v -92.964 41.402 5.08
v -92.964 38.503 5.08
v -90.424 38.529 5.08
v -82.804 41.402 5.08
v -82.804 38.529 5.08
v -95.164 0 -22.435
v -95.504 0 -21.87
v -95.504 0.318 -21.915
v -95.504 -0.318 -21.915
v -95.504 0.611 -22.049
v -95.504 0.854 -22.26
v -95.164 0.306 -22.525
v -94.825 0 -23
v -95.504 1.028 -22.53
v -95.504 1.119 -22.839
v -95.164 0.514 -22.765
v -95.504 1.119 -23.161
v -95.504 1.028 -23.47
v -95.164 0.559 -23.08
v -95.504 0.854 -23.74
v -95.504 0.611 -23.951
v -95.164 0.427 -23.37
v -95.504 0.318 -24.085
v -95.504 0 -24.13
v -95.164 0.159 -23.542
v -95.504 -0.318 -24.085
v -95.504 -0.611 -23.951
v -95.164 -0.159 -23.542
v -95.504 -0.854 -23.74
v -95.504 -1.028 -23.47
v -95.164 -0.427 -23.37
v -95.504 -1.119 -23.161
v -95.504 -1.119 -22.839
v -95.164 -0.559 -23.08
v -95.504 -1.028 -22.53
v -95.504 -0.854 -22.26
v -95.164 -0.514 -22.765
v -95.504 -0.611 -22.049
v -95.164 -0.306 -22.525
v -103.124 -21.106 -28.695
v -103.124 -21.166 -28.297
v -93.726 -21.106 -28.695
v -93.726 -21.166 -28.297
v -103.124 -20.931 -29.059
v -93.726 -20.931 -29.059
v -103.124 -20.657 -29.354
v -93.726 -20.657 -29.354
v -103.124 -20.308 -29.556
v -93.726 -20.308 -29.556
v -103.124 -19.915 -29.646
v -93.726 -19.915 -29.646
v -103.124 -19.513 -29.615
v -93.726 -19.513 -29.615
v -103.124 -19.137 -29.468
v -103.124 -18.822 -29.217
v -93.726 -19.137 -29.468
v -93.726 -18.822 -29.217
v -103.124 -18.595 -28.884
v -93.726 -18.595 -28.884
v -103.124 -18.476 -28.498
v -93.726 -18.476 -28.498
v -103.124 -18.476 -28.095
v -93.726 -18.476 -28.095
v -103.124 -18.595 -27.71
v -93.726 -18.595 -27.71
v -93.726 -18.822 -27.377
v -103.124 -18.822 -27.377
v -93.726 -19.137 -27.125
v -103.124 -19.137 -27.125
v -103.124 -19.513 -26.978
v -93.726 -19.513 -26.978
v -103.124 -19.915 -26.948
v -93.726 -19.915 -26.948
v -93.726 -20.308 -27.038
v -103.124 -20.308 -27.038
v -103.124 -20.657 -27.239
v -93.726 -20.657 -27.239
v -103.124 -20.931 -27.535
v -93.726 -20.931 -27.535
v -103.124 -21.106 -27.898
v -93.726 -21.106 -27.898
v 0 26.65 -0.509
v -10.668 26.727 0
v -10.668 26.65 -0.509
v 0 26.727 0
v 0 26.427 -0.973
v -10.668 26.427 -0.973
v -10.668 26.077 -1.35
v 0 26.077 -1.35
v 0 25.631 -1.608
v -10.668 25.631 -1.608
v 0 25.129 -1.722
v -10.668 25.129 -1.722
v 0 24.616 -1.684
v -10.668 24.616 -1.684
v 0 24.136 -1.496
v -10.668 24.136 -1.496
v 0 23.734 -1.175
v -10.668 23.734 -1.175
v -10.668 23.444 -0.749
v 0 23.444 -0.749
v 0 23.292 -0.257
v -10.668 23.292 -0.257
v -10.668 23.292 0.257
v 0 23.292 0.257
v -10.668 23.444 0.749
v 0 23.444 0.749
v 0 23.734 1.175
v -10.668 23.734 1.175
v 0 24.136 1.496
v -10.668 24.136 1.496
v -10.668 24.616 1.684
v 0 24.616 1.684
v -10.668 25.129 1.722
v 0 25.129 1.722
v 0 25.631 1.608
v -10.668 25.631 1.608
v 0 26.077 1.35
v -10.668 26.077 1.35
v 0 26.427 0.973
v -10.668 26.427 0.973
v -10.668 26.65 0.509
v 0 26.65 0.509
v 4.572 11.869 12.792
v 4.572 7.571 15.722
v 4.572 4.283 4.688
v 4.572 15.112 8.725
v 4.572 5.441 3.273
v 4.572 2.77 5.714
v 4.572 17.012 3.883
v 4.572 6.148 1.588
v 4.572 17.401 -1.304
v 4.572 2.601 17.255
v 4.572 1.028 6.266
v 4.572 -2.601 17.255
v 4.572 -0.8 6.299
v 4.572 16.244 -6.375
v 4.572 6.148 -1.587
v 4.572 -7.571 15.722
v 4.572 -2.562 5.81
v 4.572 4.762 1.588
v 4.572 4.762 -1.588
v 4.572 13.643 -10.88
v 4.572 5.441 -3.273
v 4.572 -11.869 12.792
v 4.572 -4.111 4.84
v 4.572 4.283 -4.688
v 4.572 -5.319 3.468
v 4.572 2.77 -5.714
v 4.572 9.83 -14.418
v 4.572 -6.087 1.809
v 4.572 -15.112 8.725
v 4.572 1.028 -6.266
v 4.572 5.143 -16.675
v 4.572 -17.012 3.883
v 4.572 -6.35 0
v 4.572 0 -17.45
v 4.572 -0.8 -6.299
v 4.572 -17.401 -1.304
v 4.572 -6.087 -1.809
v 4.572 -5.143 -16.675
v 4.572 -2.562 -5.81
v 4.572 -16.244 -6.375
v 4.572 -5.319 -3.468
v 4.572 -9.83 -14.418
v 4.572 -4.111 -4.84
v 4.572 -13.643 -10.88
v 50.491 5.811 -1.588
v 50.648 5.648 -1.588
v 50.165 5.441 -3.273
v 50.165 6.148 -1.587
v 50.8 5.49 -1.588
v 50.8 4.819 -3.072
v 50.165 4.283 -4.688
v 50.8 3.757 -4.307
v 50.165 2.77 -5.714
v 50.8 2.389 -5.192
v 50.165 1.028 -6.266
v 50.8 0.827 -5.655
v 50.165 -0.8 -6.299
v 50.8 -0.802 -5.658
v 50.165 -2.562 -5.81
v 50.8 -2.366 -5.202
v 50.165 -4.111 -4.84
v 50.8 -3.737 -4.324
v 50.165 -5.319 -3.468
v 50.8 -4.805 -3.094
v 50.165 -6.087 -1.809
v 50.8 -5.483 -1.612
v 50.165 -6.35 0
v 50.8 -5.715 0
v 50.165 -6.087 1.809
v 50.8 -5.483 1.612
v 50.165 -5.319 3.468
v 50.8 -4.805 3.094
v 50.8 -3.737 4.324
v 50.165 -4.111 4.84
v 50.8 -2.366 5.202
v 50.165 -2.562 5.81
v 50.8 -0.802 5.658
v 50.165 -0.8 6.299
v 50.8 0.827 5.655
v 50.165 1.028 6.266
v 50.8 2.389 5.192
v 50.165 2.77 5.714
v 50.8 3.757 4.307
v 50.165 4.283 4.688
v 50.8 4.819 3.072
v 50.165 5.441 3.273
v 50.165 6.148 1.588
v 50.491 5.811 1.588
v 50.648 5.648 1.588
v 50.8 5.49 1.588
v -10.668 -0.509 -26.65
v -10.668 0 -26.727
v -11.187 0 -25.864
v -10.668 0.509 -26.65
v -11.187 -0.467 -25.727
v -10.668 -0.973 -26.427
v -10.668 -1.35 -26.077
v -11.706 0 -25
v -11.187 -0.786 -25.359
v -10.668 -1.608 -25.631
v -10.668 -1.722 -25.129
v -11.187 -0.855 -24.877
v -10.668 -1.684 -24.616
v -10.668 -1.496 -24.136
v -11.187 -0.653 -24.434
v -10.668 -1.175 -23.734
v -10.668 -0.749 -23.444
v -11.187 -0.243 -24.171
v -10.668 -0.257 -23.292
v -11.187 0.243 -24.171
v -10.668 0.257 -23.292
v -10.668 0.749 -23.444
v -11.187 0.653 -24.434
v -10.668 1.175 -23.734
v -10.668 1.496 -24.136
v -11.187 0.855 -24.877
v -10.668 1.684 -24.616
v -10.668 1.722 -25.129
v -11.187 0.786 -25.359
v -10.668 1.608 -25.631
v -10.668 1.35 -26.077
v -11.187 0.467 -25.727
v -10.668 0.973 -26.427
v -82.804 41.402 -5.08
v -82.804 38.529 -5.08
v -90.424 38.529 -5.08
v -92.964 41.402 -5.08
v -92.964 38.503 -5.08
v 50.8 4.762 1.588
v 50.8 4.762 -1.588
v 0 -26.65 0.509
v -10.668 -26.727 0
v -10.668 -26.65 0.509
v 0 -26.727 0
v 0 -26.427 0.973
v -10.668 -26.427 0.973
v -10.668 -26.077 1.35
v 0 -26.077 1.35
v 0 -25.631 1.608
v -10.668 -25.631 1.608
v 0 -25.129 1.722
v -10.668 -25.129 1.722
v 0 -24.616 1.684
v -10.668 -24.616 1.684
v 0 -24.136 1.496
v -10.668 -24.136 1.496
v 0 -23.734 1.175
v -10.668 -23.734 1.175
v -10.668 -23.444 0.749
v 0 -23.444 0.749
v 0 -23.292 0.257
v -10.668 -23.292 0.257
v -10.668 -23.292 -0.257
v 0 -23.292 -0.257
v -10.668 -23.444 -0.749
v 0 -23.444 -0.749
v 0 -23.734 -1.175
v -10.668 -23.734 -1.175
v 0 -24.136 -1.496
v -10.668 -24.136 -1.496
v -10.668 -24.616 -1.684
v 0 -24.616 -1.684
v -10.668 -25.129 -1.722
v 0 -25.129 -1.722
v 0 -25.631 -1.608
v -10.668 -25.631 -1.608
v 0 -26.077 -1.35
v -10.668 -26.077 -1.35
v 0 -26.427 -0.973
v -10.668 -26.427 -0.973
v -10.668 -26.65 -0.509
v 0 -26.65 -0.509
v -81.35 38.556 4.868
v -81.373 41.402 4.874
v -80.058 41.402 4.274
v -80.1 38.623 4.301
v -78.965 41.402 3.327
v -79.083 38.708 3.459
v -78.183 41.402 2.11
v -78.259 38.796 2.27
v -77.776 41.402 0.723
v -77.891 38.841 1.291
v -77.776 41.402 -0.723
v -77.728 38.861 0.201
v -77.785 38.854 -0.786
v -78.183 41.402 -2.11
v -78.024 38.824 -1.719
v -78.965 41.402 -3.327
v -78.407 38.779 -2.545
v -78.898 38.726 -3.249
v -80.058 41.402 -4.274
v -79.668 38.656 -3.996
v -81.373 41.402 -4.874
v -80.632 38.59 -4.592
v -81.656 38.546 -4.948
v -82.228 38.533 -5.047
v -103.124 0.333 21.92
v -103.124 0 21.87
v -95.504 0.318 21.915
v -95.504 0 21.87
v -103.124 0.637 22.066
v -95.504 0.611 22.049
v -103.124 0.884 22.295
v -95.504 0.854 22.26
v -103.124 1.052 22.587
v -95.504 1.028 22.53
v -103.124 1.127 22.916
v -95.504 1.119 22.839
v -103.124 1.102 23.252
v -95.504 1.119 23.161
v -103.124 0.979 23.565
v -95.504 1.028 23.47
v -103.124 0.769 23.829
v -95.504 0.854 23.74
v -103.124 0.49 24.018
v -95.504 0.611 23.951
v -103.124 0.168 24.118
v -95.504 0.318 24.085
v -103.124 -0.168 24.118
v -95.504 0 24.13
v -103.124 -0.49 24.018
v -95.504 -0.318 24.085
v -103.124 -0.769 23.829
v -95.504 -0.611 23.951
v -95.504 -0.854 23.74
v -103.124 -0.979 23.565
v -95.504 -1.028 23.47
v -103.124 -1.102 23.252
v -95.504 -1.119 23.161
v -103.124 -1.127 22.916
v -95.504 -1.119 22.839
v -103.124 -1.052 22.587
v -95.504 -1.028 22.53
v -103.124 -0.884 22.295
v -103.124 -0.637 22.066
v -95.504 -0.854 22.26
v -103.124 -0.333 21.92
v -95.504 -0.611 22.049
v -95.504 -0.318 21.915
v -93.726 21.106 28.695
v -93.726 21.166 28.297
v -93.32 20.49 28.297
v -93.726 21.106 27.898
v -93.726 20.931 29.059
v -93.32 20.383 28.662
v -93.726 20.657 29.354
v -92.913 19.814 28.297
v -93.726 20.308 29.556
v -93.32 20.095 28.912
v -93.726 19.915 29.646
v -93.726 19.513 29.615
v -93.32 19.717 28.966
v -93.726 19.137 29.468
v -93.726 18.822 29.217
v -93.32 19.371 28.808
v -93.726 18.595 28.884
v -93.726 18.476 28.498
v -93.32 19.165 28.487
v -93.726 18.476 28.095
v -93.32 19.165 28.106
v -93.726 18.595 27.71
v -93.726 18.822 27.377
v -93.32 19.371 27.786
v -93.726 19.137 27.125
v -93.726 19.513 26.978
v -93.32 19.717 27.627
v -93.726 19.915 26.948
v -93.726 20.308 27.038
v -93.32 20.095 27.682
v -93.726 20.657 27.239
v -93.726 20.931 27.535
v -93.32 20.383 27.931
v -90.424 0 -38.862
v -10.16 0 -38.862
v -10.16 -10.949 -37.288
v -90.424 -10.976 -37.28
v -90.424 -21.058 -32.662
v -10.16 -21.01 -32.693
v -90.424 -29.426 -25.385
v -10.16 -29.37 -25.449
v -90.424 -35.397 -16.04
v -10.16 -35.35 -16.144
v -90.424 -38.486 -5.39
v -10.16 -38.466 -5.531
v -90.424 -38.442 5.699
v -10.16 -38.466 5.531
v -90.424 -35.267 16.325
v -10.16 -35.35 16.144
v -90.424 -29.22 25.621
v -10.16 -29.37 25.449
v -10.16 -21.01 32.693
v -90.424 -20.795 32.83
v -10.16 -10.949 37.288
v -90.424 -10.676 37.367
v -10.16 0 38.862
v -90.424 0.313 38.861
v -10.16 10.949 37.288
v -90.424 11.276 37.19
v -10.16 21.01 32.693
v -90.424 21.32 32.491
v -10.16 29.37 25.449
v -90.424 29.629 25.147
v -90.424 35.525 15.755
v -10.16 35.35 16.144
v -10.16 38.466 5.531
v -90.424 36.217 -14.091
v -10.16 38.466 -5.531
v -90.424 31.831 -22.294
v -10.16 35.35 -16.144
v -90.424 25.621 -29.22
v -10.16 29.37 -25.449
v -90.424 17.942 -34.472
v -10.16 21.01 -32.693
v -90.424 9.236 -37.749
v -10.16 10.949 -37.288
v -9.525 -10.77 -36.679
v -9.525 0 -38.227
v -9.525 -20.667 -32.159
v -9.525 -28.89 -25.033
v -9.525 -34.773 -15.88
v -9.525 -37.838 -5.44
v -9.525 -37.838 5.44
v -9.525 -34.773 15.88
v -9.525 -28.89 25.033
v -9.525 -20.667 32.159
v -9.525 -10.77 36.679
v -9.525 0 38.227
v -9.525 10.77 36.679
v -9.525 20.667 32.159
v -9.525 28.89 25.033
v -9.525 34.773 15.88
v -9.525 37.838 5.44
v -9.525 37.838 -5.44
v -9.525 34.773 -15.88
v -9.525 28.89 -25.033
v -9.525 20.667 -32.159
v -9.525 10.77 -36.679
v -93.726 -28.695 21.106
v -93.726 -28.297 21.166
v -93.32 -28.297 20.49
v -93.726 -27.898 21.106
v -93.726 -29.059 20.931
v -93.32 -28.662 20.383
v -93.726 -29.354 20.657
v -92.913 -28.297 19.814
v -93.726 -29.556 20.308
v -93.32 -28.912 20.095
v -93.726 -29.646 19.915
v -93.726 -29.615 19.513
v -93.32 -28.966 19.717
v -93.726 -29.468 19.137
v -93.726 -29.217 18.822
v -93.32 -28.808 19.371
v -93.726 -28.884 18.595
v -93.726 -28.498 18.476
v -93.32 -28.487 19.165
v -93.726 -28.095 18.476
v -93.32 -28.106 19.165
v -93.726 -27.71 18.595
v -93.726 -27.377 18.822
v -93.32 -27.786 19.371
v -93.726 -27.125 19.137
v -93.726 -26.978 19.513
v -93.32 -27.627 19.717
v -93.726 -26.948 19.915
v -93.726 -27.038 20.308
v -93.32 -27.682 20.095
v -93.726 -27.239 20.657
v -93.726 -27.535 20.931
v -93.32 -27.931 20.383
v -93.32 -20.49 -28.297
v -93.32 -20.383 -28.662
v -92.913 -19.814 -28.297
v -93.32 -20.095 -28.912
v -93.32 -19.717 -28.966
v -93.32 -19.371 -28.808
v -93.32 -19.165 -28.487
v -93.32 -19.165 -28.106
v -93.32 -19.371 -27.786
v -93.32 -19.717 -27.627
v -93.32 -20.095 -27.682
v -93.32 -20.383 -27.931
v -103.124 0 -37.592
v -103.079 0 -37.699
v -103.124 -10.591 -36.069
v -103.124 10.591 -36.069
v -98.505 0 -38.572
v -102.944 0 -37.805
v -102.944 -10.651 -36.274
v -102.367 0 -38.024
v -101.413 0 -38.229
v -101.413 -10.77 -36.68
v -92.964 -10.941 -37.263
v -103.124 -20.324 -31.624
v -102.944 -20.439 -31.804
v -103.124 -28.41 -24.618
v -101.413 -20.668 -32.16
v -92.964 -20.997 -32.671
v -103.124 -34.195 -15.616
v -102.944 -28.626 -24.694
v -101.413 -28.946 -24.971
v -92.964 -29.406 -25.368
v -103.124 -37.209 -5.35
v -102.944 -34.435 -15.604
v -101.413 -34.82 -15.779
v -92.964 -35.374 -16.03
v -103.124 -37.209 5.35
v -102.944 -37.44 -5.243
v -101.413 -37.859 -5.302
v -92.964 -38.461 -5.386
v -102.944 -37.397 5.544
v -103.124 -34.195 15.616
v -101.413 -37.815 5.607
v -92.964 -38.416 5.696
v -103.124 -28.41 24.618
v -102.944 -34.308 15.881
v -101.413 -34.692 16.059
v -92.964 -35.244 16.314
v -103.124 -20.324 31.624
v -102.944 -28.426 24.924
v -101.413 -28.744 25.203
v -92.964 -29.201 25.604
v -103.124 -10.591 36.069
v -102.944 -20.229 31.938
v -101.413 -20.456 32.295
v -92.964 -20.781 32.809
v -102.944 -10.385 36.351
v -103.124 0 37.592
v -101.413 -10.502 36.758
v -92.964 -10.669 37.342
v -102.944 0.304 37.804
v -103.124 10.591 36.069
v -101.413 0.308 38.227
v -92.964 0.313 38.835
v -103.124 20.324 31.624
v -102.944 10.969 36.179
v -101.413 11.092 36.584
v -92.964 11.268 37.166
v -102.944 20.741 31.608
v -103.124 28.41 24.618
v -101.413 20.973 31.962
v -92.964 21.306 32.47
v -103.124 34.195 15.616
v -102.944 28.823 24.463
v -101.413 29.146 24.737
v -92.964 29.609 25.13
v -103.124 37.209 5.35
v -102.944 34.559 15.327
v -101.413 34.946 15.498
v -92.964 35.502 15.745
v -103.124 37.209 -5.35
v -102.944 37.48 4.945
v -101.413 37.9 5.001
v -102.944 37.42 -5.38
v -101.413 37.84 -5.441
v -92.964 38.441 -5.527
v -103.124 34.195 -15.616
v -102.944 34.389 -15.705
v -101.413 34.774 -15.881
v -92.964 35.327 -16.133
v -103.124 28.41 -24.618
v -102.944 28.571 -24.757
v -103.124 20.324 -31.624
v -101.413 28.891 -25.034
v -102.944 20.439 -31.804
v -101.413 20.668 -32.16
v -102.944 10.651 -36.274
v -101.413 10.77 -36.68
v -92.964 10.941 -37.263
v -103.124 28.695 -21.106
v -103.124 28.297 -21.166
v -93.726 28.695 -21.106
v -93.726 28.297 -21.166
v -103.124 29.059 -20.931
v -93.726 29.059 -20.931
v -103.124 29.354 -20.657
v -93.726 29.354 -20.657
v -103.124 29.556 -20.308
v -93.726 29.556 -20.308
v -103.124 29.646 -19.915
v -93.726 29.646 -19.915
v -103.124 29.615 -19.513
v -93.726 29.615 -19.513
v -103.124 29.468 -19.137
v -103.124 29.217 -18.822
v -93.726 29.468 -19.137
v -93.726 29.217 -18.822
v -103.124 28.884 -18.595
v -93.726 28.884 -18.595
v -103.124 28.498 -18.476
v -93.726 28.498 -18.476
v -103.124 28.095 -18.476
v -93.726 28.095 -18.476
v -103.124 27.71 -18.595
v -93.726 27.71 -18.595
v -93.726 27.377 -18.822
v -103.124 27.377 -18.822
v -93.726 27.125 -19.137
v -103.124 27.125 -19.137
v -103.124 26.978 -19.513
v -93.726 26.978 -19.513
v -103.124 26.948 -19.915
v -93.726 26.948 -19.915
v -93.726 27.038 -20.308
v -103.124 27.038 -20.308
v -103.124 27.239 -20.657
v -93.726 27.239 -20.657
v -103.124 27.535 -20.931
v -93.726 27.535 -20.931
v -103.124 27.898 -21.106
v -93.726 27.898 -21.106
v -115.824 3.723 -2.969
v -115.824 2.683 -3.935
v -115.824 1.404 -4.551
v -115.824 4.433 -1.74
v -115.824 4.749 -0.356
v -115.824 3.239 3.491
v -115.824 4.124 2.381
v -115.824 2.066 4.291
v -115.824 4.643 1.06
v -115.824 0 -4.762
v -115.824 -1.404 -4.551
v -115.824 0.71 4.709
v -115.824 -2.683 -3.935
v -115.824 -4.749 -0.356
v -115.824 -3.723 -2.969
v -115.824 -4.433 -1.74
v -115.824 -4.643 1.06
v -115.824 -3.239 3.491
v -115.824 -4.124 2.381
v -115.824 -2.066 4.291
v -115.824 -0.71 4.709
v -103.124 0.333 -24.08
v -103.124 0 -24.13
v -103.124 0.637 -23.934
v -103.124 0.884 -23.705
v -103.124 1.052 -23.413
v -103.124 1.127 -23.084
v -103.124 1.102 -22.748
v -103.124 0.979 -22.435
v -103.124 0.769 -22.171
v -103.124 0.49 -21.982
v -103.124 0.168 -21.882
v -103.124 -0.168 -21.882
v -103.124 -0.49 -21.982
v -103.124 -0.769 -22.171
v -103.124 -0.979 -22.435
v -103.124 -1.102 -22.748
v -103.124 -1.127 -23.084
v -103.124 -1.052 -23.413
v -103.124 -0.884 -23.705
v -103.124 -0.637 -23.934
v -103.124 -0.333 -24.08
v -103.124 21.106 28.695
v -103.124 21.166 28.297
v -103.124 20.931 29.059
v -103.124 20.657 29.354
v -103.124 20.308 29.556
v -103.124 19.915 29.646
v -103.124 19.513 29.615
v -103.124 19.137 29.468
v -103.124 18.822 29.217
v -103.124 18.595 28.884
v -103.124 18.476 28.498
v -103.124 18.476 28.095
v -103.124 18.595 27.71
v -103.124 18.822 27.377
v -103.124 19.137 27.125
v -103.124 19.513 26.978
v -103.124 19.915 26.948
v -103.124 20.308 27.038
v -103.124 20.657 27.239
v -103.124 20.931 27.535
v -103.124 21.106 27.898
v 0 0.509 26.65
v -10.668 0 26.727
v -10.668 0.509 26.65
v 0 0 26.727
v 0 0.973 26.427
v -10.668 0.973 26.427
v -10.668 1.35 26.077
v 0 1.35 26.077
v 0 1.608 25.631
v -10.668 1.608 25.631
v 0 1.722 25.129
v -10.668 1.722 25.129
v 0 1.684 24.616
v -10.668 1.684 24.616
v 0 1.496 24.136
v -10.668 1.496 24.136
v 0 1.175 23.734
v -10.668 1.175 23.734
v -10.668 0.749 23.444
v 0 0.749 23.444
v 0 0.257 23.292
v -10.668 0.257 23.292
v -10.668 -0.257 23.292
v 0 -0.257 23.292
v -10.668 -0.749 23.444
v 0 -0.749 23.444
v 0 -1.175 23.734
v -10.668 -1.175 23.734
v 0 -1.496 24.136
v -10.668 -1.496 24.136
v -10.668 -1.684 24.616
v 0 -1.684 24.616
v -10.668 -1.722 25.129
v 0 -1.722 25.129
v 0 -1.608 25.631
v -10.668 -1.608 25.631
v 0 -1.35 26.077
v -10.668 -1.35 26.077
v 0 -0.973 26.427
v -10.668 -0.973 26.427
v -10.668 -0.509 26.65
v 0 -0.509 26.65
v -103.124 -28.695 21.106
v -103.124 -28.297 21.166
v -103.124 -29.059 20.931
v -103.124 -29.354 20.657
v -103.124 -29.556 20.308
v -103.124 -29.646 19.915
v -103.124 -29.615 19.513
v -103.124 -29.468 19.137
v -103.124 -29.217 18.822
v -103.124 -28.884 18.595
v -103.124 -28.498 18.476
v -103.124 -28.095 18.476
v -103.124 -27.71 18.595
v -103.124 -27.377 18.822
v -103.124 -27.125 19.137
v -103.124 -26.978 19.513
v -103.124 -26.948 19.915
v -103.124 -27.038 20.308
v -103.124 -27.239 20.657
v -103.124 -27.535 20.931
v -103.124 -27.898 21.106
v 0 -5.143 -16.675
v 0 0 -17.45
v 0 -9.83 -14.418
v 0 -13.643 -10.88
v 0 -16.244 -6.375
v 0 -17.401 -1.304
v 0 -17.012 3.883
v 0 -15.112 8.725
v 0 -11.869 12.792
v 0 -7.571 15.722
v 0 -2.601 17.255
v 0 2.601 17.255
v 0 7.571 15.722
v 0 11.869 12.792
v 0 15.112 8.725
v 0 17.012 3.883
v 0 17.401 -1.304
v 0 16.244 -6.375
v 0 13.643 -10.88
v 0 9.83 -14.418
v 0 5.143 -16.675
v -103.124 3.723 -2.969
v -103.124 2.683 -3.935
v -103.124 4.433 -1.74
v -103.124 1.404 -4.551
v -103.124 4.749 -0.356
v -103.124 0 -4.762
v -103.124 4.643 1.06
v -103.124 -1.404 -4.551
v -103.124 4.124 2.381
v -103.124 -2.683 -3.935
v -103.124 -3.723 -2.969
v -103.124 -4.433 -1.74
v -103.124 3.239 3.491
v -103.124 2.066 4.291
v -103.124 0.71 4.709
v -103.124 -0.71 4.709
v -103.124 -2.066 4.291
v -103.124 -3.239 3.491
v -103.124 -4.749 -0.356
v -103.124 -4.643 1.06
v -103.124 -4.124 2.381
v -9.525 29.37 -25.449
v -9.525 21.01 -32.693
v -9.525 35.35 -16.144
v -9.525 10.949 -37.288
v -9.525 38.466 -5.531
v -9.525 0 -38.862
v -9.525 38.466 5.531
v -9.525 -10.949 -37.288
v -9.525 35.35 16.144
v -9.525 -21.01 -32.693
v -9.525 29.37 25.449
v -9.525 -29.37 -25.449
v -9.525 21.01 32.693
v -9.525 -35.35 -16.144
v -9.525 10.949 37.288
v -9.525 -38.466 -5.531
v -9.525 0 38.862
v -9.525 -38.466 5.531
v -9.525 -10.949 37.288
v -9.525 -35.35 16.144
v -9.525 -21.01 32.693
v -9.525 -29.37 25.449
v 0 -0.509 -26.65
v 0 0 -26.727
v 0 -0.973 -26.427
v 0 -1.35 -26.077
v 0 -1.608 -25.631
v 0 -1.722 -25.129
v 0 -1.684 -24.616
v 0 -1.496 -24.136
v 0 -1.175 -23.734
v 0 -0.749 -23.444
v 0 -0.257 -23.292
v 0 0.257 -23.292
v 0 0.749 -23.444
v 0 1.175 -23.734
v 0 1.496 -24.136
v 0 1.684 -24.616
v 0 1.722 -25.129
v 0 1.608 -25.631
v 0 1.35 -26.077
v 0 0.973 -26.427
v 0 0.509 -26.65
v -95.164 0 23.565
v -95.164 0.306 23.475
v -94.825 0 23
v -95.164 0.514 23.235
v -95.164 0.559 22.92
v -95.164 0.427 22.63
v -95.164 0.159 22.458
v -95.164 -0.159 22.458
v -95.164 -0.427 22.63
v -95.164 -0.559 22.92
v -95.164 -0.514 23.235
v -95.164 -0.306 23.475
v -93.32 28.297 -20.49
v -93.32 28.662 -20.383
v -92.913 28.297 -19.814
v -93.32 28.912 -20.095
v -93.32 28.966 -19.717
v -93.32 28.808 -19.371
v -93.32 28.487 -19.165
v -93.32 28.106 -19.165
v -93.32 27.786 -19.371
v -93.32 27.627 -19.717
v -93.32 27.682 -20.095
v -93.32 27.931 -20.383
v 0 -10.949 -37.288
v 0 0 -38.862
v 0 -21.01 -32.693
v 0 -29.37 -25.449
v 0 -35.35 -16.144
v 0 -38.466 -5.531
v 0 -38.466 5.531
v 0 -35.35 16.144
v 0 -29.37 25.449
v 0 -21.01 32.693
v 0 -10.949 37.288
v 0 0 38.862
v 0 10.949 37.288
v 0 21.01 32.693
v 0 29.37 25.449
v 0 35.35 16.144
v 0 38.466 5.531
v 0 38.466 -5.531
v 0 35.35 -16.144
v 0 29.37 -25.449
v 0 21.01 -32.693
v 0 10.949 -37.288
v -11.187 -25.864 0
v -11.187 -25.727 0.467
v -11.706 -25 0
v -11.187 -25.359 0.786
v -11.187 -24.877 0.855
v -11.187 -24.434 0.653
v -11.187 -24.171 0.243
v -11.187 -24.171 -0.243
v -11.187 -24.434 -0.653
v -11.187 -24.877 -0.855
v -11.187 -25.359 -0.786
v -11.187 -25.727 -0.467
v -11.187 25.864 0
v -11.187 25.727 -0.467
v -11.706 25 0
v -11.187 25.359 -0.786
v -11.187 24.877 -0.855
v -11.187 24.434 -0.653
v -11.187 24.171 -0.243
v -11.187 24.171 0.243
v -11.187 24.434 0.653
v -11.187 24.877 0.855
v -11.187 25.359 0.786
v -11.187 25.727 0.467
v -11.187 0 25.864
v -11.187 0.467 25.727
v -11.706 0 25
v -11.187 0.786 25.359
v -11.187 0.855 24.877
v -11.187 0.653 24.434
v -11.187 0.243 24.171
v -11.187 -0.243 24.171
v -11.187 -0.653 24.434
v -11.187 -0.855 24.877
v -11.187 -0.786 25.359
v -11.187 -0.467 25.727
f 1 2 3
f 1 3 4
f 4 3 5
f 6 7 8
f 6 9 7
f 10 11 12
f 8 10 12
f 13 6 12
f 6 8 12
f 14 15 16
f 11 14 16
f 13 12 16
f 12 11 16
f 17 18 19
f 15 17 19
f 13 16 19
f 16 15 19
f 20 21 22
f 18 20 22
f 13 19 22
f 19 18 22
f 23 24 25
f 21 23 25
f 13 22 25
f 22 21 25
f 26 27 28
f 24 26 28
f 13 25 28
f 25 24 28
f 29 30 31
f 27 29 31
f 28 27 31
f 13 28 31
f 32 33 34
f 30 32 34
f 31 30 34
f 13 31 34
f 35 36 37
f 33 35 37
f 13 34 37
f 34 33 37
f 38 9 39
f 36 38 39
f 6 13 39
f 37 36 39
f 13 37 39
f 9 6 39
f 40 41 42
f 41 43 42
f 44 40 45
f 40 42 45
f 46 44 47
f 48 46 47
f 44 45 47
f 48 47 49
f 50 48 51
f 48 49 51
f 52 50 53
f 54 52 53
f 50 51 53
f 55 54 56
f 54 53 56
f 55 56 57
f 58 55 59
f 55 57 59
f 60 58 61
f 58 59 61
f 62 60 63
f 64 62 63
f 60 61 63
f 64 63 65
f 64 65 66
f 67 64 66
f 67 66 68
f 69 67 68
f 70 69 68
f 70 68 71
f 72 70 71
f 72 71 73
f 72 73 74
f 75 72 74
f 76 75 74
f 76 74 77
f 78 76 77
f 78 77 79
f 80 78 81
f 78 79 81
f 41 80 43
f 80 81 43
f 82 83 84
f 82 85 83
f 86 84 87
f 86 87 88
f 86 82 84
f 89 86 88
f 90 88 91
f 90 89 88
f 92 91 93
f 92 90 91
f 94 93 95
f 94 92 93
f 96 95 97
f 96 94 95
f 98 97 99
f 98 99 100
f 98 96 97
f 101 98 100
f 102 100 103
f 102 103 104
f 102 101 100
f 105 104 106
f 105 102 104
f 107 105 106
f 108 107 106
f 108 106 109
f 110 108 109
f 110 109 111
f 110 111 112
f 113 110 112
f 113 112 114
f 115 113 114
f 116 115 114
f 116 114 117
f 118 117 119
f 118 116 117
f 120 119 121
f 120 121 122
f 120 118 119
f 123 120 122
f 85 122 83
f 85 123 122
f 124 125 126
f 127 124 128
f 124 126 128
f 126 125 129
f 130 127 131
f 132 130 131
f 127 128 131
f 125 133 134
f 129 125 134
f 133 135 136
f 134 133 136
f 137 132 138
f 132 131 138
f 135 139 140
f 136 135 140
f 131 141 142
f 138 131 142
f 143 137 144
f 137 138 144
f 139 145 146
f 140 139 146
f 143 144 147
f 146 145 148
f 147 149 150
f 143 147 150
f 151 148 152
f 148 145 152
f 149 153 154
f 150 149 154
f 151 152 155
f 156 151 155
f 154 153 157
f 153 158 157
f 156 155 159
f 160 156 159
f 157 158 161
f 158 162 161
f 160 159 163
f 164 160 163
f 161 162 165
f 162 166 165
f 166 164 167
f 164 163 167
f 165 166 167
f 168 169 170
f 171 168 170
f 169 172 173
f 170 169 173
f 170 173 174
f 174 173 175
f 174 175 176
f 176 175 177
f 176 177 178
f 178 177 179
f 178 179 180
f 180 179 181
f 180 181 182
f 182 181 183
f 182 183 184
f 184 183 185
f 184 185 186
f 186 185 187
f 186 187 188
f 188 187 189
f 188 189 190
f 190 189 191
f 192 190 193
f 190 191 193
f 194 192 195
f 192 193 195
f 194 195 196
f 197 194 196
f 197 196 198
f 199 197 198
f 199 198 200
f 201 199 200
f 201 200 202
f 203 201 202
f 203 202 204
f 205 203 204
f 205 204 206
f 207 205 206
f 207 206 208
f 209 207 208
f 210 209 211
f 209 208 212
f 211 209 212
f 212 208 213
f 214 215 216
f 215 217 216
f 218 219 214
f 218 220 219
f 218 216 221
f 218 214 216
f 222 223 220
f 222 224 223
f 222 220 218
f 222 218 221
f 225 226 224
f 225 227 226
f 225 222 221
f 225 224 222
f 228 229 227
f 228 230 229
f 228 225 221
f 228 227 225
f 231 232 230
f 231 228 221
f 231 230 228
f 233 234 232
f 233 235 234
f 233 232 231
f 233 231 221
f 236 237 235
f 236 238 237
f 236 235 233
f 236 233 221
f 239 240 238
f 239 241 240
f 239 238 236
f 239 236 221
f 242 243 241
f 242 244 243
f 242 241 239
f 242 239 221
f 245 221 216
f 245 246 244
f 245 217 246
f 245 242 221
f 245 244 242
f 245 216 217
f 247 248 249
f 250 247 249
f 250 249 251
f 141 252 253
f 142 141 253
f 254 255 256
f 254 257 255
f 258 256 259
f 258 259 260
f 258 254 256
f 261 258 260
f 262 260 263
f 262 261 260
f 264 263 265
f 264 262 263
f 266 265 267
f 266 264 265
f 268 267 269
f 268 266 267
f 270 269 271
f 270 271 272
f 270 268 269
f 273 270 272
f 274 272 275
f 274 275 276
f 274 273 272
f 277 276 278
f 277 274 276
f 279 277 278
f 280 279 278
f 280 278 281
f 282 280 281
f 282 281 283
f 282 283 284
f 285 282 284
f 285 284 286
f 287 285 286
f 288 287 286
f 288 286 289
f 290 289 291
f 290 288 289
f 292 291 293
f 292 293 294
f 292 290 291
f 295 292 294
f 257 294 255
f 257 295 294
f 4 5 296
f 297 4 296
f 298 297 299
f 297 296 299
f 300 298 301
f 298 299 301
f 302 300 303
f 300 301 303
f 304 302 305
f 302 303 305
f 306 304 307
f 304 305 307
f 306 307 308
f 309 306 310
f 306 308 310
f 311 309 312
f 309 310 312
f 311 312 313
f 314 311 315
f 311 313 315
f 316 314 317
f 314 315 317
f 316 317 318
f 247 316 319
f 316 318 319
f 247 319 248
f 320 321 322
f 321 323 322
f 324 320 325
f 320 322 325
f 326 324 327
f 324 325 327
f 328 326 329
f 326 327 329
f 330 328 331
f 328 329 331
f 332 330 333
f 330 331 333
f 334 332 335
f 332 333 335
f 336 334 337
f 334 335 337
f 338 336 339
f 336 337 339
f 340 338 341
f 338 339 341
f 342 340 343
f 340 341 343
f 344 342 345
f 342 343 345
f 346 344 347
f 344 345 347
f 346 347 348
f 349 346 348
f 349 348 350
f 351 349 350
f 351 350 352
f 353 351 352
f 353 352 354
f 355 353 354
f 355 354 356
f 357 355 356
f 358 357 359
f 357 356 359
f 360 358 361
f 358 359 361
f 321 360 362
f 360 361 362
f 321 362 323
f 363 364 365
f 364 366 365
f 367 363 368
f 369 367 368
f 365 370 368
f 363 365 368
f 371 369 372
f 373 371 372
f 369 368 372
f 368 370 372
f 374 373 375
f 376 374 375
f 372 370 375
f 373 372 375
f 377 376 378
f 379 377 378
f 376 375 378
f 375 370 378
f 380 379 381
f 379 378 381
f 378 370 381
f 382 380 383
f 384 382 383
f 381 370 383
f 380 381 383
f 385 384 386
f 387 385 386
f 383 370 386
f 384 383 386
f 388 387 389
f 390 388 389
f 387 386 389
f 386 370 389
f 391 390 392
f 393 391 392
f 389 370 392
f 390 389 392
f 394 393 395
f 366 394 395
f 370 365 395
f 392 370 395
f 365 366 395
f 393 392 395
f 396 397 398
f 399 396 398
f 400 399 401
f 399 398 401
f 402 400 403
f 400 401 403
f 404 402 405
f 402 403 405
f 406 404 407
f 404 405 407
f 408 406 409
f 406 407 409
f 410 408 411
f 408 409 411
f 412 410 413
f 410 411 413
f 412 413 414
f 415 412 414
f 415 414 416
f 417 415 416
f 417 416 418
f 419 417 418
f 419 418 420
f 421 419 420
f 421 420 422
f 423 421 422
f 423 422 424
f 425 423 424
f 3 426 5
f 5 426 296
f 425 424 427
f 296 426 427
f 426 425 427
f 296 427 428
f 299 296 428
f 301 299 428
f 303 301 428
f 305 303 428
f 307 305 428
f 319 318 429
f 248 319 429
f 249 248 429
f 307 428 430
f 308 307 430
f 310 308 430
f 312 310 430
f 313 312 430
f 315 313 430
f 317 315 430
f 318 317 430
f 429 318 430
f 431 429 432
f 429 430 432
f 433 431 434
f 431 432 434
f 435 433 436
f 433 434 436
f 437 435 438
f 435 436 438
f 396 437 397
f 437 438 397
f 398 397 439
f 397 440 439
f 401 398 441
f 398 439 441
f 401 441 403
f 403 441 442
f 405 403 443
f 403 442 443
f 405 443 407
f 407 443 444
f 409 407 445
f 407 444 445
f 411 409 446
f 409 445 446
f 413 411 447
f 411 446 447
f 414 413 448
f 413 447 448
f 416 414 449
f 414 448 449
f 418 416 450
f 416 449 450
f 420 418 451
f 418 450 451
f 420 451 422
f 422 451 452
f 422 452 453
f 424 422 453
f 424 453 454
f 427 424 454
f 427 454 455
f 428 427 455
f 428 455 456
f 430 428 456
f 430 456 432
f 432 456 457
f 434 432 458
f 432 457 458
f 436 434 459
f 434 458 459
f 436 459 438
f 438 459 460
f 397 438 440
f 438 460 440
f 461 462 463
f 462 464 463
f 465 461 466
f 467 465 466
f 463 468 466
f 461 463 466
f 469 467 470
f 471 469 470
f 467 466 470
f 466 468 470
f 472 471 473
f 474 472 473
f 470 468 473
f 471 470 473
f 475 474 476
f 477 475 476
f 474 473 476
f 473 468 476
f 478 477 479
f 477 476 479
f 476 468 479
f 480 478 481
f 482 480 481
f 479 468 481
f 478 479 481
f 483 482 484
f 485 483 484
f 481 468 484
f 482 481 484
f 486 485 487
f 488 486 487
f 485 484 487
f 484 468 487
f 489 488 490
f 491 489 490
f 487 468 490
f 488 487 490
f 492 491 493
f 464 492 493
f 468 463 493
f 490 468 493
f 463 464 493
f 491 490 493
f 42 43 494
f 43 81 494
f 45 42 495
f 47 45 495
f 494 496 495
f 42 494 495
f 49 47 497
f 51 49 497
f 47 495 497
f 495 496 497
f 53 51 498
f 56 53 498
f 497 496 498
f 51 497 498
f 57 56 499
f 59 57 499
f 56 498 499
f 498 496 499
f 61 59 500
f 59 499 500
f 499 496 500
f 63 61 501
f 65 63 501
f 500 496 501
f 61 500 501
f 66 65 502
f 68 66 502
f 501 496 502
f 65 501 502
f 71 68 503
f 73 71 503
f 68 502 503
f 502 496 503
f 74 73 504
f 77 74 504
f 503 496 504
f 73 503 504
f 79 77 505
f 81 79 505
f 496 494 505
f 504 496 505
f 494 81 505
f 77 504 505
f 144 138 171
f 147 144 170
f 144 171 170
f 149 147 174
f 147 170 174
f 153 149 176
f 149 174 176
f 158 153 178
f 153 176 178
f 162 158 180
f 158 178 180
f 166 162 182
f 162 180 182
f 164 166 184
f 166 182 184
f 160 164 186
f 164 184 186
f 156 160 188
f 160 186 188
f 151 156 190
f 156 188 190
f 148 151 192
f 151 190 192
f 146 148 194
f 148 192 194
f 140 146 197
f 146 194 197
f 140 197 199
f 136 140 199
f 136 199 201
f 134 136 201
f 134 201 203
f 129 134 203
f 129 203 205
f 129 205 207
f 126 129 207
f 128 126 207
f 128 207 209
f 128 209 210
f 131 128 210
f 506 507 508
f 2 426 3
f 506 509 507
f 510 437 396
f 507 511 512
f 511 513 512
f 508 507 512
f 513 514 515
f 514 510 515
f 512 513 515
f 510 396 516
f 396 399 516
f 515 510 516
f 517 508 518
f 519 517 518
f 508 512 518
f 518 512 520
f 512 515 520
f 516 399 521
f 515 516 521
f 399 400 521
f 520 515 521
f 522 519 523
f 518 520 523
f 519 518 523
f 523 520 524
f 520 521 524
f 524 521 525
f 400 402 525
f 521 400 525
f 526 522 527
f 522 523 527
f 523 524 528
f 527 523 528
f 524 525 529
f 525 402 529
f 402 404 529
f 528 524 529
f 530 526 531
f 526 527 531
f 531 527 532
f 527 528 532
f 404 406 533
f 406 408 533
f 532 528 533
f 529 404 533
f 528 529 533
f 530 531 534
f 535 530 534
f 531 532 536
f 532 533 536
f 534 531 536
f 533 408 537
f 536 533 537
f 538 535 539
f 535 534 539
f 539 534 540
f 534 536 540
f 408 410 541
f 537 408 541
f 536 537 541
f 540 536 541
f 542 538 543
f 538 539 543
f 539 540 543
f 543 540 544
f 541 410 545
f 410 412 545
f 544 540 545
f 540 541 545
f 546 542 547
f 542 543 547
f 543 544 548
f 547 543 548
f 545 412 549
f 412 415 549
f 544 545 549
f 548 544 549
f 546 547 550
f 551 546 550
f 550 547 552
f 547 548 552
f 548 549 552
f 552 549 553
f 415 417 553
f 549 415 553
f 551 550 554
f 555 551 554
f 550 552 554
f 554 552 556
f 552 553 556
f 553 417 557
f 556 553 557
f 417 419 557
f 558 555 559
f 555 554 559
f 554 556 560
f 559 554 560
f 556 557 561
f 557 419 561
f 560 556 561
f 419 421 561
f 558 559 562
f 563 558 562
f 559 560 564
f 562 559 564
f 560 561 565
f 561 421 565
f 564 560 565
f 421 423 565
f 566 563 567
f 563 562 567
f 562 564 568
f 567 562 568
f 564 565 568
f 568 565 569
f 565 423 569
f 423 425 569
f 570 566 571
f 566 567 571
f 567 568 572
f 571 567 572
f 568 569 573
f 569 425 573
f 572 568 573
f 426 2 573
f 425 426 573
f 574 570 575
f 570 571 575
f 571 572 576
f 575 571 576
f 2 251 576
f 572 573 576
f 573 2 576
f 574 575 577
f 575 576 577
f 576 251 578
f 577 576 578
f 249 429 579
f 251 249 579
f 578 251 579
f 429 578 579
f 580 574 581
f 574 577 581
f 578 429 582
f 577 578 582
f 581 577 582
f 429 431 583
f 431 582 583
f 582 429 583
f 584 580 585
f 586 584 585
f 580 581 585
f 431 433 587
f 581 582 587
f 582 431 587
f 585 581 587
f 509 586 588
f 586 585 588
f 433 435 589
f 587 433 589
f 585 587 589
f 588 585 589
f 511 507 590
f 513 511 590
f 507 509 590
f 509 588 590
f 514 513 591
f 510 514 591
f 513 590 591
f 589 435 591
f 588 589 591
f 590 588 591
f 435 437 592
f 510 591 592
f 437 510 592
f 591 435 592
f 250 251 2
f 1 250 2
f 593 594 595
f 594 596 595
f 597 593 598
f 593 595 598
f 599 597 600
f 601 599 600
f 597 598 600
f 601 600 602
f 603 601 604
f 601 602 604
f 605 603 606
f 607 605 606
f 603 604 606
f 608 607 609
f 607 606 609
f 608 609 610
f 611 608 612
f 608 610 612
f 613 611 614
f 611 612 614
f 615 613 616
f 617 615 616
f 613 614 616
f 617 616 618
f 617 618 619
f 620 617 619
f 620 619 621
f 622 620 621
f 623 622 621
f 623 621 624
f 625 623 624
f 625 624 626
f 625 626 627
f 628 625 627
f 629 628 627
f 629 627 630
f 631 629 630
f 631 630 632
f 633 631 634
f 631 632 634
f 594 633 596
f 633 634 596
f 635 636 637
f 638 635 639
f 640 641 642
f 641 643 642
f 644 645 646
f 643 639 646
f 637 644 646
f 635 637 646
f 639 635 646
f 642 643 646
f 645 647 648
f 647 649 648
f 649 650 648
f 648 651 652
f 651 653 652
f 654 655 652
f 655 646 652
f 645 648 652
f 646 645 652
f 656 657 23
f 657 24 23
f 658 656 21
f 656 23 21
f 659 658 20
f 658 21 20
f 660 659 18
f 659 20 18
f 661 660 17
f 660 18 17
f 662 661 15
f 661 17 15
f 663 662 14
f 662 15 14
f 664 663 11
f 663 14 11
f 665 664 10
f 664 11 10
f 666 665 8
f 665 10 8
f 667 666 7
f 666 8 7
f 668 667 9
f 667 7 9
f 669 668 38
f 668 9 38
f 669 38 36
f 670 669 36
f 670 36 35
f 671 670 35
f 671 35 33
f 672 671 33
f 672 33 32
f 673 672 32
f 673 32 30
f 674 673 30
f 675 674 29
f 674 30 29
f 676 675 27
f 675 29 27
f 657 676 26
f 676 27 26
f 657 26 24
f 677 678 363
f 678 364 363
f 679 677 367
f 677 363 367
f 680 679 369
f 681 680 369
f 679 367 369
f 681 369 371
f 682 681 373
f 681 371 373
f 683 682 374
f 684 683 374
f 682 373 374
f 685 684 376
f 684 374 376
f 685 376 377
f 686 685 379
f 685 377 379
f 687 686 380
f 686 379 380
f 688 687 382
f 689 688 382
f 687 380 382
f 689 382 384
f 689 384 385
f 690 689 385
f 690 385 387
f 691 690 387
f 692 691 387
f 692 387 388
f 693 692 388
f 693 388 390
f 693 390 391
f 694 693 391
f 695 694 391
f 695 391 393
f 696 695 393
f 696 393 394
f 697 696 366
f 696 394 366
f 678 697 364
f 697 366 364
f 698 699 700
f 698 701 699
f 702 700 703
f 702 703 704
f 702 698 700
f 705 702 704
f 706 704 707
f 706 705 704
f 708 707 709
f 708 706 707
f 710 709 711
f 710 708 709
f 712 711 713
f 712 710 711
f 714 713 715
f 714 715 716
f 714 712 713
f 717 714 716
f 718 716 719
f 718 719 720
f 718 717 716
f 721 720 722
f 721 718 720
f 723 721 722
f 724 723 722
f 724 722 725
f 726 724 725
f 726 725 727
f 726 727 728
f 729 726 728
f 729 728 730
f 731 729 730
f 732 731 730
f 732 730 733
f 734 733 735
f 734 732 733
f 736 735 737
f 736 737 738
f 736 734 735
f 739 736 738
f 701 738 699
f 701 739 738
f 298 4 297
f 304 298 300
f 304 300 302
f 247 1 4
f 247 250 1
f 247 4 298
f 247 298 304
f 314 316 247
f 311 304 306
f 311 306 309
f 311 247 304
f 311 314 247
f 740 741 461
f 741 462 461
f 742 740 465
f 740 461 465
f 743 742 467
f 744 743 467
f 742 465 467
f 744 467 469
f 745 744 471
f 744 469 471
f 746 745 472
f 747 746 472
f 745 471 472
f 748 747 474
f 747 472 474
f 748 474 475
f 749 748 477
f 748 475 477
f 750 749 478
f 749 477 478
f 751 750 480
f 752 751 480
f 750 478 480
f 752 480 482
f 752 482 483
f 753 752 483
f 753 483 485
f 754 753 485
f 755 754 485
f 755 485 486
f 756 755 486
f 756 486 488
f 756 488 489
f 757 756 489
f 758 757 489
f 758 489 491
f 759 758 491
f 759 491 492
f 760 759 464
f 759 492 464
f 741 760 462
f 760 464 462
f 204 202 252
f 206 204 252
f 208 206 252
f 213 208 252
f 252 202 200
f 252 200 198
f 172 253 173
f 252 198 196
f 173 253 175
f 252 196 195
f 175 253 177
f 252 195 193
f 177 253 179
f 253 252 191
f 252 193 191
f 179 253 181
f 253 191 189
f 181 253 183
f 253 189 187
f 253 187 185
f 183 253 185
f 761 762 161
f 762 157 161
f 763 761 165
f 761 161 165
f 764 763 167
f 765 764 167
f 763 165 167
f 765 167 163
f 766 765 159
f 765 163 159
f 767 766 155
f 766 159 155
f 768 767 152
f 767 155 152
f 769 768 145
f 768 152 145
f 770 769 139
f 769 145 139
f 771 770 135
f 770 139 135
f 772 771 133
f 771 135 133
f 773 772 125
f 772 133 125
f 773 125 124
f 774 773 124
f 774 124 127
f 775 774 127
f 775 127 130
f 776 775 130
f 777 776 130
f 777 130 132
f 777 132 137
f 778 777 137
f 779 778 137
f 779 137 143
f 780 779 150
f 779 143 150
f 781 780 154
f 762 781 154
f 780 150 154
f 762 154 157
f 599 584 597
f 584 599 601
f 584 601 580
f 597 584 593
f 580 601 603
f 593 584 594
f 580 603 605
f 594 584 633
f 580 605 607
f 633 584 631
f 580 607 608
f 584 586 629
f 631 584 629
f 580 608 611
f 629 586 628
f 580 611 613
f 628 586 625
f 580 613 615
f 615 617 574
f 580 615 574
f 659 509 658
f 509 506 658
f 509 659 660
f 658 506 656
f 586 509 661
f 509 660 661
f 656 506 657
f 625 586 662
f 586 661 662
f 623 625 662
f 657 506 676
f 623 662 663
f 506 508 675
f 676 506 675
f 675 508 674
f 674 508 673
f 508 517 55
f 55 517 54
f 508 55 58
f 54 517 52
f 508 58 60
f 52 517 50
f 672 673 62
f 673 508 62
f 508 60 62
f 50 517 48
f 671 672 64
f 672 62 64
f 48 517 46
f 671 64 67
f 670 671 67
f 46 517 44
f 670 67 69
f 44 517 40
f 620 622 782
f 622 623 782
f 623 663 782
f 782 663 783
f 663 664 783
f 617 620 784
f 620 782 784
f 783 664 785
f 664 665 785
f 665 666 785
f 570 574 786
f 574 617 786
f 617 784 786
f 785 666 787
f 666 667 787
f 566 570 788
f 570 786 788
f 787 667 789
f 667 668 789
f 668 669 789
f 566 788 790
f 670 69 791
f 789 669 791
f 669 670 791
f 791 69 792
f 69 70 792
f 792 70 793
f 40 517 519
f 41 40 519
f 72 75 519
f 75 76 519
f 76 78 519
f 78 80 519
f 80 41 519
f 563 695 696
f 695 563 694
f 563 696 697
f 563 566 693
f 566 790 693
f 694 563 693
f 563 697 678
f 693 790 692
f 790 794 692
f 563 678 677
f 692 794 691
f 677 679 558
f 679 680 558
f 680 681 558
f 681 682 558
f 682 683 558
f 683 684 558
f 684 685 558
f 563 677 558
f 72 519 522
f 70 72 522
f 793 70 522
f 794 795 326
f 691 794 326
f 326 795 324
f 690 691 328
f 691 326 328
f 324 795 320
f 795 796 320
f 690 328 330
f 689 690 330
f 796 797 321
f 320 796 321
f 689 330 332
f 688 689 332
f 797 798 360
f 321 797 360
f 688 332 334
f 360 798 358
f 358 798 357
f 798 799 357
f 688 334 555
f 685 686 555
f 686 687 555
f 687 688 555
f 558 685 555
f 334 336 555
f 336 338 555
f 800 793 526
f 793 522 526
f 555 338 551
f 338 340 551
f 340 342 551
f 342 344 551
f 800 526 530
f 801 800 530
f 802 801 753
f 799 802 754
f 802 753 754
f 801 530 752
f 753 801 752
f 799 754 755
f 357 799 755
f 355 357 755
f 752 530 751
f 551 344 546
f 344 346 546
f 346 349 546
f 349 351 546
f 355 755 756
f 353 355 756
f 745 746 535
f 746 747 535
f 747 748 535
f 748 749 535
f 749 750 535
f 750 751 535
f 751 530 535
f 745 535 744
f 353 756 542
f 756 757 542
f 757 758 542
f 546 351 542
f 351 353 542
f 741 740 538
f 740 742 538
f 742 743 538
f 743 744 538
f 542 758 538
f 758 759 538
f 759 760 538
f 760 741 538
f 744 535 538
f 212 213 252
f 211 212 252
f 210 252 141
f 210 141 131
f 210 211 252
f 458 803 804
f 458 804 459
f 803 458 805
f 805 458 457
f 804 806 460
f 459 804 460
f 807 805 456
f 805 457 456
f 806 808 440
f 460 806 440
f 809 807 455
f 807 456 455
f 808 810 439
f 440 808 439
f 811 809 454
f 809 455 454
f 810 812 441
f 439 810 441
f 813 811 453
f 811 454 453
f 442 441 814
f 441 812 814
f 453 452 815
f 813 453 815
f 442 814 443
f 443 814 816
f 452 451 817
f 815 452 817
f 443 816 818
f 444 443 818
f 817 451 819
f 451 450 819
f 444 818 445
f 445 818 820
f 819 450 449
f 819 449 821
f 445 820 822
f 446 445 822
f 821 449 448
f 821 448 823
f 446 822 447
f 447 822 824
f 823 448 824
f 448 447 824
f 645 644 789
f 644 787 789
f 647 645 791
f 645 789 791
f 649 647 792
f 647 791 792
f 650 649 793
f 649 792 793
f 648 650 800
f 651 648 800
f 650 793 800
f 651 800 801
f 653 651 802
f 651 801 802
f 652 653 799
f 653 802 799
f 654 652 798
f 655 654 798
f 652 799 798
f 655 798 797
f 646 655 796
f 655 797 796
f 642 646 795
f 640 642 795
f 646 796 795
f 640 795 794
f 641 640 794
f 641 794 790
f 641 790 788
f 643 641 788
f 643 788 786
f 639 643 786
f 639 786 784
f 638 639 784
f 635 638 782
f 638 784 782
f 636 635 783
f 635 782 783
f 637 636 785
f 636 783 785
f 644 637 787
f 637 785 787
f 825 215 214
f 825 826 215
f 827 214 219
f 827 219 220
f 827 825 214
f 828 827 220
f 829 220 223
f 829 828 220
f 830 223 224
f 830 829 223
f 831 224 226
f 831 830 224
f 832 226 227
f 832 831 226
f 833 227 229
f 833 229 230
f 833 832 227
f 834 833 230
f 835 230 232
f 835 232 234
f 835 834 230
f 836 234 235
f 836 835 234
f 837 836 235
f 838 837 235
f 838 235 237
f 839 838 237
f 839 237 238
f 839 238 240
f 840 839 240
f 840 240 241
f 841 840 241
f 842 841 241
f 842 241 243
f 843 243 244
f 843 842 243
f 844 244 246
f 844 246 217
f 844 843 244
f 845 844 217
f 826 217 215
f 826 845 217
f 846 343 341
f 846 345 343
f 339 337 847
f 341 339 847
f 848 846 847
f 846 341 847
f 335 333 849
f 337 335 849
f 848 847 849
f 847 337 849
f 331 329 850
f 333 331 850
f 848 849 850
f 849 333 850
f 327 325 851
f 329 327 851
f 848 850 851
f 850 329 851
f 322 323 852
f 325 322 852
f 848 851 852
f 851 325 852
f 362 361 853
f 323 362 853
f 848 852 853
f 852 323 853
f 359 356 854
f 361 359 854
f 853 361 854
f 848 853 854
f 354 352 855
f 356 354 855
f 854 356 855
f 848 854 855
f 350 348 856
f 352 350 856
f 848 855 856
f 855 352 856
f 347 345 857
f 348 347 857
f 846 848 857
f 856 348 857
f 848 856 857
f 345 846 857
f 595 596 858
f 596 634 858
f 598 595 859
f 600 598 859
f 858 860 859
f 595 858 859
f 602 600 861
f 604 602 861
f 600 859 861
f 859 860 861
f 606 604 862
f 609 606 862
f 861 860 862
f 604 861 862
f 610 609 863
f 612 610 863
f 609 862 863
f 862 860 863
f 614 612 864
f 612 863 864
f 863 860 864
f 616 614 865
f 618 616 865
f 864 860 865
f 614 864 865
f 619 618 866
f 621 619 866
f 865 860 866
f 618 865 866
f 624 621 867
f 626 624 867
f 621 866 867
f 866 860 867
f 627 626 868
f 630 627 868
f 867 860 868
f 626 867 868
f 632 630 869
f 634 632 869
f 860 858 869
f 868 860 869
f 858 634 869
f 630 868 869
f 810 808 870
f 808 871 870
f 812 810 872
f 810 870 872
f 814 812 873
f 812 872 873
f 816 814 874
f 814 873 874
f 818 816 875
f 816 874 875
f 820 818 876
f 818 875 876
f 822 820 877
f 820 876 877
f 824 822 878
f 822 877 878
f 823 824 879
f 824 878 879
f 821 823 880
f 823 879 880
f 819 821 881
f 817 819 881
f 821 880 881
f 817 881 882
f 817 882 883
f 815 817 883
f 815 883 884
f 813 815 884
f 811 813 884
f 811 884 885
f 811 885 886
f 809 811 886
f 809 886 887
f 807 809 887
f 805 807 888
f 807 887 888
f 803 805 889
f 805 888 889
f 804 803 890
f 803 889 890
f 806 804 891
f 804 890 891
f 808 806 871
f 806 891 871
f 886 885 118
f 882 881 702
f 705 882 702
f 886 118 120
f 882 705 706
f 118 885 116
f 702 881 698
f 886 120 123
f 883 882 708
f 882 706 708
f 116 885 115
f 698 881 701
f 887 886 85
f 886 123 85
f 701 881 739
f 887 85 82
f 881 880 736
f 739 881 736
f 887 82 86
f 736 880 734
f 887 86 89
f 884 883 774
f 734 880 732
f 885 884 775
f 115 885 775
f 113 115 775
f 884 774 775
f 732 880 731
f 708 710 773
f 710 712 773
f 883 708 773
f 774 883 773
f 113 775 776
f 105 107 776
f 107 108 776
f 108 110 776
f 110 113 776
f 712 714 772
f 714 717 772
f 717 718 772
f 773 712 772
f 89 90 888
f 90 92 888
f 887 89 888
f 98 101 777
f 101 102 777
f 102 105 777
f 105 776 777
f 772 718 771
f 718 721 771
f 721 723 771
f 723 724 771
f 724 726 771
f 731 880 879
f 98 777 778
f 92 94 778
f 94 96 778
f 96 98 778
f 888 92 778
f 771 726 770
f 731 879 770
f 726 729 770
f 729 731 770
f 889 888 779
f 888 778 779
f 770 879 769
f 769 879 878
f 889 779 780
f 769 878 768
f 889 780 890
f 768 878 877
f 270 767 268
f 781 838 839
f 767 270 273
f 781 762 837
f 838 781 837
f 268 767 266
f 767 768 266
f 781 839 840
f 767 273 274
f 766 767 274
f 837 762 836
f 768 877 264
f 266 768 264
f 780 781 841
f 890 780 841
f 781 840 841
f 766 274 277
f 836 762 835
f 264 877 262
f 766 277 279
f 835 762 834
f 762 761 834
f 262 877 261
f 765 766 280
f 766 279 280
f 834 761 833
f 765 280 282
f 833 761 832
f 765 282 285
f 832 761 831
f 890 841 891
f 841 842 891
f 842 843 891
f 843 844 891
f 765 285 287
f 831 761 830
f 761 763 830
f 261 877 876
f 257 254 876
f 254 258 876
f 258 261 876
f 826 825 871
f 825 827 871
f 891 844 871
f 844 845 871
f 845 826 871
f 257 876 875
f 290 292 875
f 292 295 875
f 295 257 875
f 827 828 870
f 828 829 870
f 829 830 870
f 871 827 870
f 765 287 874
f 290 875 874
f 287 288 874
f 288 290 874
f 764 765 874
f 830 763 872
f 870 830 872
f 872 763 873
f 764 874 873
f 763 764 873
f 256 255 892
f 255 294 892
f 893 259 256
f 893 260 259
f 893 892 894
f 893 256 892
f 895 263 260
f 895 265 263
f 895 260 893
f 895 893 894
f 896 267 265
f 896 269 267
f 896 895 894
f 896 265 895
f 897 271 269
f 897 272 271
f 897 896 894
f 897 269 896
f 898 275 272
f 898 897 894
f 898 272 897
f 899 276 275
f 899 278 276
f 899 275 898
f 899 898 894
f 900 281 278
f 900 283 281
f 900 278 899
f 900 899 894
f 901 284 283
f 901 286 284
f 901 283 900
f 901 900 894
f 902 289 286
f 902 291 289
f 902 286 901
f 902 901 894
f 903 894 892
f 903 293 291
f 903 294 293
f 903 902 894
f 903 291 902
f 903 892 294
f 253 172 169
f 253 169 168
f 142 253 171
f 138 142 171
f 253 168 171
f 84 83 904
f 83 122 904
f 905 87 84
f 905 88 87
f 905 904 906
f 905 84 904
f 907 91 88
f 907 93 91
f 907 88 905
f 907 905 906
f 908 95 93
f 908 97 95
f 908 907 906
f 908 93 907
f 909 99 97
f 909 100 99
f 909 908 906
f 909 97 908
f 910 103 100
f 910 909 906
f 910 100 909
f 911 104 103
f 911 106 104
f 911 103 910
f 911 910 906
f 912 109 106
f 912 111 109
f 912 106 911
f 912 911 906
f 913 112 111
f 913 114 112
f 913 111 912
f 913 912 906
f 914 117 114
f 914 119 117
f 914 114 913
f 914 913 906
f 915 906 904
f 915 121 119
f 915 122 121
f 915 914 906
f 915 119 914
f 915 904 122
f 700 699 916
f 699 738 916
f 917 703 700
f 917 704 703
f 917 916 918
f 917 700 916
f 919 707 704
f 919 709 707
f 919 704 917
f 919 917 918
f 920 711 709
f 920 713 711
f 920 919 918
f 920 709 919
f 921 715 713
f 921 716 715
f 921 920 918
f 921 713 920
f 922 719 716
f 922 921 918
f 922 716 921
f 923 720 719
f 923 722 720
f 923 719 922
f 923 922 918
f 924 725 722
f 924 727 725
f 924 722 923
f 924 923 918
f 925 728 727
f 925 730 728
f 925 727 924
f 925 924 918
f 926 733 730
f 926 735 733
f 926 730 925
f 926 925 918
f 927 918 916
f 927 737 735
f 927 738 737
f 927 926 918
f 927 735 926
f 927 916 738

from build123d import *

# Parameters (mm, degrees)
FILLET1_SIZE              = 1.27
FILLET1_SIZE_2            = 12.7
SKETCH3_W                 = 3.175
SKETCH3_H                 = 3.175
CUT_EXTRUDE1_DEPTH        = 46.228
F_4_40_TAPPED_HOLE1_D     = 2.2606
F_4_40_TAPPED_HOLE1_DEPTH = 7.62
F_4_40_TAPPED_HOLE1_TIP   = 0.679152758
CIRPATTERN1_COUNT         = 4
BOSS_EXTRUDE1_DEPTH       = 41.402


# Read off the part's stored shape, not the designer's step: #6-32 Tapped Hole1
with BuildPart() as part:
    # Sketch2 → Revolve1 (revolve)
    with BuildSketch(Plane.XY, mode=Mode.PRIVATE) as revolve1_sk:
        Polygon((50.8, 0), (-115.824, 0), (-115.824, 4.7625), (-103.124, 4.7625), (-103.124, 38.862), (-10.16, 38.862), (-9.525, 38.227), (-9.525, 38.862), (0, 38.862), (0, 17.4498), (4.572, 17.4498), (4.572, 6.35), (50.165, 6.35), (50.8, 5.715), align=None)
    revolve(revolve1_sk.sketch.rotate(Axis((88.99, 0, 0), (-1, 0, 0)), 90), axis=Axis((88.99, 0, 0), (-1, 0, 0)))

    # Fillet1
    # an asymmetric fillet: 12.7, 1.27 mm, written as the material it takes off along each edge
    with BuildSketch(Plane(origin=(-103.124, 0, 0), x_dir=(0, 0, -1), z_dir=(0, 1, 0))) as fillet1_piece_1:
        with BuildLine():
            Bezier((38.862 - FILLET1_SIZE, 0), (38.862, 0), (38.862, -FILLET1_SIZE_2), weights=[1, 0.707106781, 1])
            Line((38.862, -FILLET1_SIZE_2), (38.862, 0))
            Line((38.862, 0), (38.862 - FILLET1_SIZE, 0))
        make_face()
    revolve(axis=Axis((-103.124, 0, 0), (-1, 0, 0)), mode=Mode.SUBTRACT)

    # Sketch3 → Cut-Extrude1 (cut)
    with BuildSketch(Plane(origin=(50.8, 0, 0), x_dir=(0, 0, -1), z_dir=(1, 0, 0))):
        with Locations((0, 6.35)):
            Rectangle(SKETCH3_W, SKETCH3_H)
    extrude(amount=-CUT_EXTRUDE1_DEPTH, mode=Mode.SUBTRACT)

    # Sketch8 → #8-32 Tapped Hole3 (revolve, cut)
    with BuildSketch(Plane(origin=(0, 0, -25), x_dir=(0, 0, -1), z_dir=(0, 1, 0))):
        Polygon((0, 0), (0, 11.705806461), (1.7272, 10.668), (1.7272, 0), align=None)
    f_8_32_tapped_hole3 = revolve(axis=Axis((6.35, 0, -25), (-1, 0, 0)), mode=Mode.SUBTRACT)

    # #6-32 Tapped Hole1 outline → #6-32 Tapped Hole1 (revolve, cut)
    with BuildSketch(Plane(origin=(0, 19.813624417, 28.296788218), x_dir=(0, 1, 0), z_dir=(0, 0, -1))):
        Polygon((1.35255, -93.726), (0, -92.91330597), (0, -103.124), (1.35255, -103.124), align=None)
    f_6_32_tapped_hole1 = revolve(axis=Axis((0, 19.813624417, 28.296788218), (1, 0, 0)), mode=Mode.SUBTRACT)

    # #4-40 Tapped Hole1
    with Locations(Plane.ZY.offset(103.124)):
        with Locations((-23, 0), (23, 0)):
            Hole(F_4_40_TAPPED_HOLE1_D / 2, depth=F_4_40_TAPPED_HOLE1_DEPTH)
            with Locations((0, 0, -(F_4_40_TAPPED_HOLE1_DEPTH + F_4_40_TAPPED_HOLE1_TIP / 2))):  # 118° drill point
                Cone(0, F_4_40_TAPPED_HOLE1_D / 2, F_4_40_TAPPED_HOLE1_TIP, mode=Mode.SUBTRACT)

    # CirPattern1: #8-32 Tapped Hole3, #6-32 Tapped Hole1 ×4 about axis
    cirpattern1_axis = Axis((0, 0, 0), (1, 0, 0))
    add([f_8_32_tapped_hole3.rotate(cirpattern1_axis, i * 360 / CIRPATTERN1_COUNT) for i in range(1, CIRPATTERN1_COUNT)], mode=Mode.SUBTRACT)
    add([f_6_32_tapped_hole1.rotate(cirpattern1_axis, i * 360 / CIRPATTERN1_COUNT) for i in range(1, CIRPATTERN1_COUNT)], mode=Mode.SUBTRACT)

    # Sketch12 → Boss-Extrude1 (add)
    with BuildSketch(Plane(origin=(0, 0, 0), x_dir=(1, 0, 0), z_dir=(0, 1, 0))):
        with BuildLine():
            Line((-92.964, -5.08), (-82.804, -5.08))
            ThreePointArc((-82.804, -5.08), (-77.724, 0), (-82.804, 5.08))
            Line((-82.804, 5.08), (-92.964, 5.08))
            Line((-92.964, 5.08), (-92.964, -5.08))
        make_face()
    extrude(amount=BOSS_EXTRUDE1_DEPTH)


solid = part.part
